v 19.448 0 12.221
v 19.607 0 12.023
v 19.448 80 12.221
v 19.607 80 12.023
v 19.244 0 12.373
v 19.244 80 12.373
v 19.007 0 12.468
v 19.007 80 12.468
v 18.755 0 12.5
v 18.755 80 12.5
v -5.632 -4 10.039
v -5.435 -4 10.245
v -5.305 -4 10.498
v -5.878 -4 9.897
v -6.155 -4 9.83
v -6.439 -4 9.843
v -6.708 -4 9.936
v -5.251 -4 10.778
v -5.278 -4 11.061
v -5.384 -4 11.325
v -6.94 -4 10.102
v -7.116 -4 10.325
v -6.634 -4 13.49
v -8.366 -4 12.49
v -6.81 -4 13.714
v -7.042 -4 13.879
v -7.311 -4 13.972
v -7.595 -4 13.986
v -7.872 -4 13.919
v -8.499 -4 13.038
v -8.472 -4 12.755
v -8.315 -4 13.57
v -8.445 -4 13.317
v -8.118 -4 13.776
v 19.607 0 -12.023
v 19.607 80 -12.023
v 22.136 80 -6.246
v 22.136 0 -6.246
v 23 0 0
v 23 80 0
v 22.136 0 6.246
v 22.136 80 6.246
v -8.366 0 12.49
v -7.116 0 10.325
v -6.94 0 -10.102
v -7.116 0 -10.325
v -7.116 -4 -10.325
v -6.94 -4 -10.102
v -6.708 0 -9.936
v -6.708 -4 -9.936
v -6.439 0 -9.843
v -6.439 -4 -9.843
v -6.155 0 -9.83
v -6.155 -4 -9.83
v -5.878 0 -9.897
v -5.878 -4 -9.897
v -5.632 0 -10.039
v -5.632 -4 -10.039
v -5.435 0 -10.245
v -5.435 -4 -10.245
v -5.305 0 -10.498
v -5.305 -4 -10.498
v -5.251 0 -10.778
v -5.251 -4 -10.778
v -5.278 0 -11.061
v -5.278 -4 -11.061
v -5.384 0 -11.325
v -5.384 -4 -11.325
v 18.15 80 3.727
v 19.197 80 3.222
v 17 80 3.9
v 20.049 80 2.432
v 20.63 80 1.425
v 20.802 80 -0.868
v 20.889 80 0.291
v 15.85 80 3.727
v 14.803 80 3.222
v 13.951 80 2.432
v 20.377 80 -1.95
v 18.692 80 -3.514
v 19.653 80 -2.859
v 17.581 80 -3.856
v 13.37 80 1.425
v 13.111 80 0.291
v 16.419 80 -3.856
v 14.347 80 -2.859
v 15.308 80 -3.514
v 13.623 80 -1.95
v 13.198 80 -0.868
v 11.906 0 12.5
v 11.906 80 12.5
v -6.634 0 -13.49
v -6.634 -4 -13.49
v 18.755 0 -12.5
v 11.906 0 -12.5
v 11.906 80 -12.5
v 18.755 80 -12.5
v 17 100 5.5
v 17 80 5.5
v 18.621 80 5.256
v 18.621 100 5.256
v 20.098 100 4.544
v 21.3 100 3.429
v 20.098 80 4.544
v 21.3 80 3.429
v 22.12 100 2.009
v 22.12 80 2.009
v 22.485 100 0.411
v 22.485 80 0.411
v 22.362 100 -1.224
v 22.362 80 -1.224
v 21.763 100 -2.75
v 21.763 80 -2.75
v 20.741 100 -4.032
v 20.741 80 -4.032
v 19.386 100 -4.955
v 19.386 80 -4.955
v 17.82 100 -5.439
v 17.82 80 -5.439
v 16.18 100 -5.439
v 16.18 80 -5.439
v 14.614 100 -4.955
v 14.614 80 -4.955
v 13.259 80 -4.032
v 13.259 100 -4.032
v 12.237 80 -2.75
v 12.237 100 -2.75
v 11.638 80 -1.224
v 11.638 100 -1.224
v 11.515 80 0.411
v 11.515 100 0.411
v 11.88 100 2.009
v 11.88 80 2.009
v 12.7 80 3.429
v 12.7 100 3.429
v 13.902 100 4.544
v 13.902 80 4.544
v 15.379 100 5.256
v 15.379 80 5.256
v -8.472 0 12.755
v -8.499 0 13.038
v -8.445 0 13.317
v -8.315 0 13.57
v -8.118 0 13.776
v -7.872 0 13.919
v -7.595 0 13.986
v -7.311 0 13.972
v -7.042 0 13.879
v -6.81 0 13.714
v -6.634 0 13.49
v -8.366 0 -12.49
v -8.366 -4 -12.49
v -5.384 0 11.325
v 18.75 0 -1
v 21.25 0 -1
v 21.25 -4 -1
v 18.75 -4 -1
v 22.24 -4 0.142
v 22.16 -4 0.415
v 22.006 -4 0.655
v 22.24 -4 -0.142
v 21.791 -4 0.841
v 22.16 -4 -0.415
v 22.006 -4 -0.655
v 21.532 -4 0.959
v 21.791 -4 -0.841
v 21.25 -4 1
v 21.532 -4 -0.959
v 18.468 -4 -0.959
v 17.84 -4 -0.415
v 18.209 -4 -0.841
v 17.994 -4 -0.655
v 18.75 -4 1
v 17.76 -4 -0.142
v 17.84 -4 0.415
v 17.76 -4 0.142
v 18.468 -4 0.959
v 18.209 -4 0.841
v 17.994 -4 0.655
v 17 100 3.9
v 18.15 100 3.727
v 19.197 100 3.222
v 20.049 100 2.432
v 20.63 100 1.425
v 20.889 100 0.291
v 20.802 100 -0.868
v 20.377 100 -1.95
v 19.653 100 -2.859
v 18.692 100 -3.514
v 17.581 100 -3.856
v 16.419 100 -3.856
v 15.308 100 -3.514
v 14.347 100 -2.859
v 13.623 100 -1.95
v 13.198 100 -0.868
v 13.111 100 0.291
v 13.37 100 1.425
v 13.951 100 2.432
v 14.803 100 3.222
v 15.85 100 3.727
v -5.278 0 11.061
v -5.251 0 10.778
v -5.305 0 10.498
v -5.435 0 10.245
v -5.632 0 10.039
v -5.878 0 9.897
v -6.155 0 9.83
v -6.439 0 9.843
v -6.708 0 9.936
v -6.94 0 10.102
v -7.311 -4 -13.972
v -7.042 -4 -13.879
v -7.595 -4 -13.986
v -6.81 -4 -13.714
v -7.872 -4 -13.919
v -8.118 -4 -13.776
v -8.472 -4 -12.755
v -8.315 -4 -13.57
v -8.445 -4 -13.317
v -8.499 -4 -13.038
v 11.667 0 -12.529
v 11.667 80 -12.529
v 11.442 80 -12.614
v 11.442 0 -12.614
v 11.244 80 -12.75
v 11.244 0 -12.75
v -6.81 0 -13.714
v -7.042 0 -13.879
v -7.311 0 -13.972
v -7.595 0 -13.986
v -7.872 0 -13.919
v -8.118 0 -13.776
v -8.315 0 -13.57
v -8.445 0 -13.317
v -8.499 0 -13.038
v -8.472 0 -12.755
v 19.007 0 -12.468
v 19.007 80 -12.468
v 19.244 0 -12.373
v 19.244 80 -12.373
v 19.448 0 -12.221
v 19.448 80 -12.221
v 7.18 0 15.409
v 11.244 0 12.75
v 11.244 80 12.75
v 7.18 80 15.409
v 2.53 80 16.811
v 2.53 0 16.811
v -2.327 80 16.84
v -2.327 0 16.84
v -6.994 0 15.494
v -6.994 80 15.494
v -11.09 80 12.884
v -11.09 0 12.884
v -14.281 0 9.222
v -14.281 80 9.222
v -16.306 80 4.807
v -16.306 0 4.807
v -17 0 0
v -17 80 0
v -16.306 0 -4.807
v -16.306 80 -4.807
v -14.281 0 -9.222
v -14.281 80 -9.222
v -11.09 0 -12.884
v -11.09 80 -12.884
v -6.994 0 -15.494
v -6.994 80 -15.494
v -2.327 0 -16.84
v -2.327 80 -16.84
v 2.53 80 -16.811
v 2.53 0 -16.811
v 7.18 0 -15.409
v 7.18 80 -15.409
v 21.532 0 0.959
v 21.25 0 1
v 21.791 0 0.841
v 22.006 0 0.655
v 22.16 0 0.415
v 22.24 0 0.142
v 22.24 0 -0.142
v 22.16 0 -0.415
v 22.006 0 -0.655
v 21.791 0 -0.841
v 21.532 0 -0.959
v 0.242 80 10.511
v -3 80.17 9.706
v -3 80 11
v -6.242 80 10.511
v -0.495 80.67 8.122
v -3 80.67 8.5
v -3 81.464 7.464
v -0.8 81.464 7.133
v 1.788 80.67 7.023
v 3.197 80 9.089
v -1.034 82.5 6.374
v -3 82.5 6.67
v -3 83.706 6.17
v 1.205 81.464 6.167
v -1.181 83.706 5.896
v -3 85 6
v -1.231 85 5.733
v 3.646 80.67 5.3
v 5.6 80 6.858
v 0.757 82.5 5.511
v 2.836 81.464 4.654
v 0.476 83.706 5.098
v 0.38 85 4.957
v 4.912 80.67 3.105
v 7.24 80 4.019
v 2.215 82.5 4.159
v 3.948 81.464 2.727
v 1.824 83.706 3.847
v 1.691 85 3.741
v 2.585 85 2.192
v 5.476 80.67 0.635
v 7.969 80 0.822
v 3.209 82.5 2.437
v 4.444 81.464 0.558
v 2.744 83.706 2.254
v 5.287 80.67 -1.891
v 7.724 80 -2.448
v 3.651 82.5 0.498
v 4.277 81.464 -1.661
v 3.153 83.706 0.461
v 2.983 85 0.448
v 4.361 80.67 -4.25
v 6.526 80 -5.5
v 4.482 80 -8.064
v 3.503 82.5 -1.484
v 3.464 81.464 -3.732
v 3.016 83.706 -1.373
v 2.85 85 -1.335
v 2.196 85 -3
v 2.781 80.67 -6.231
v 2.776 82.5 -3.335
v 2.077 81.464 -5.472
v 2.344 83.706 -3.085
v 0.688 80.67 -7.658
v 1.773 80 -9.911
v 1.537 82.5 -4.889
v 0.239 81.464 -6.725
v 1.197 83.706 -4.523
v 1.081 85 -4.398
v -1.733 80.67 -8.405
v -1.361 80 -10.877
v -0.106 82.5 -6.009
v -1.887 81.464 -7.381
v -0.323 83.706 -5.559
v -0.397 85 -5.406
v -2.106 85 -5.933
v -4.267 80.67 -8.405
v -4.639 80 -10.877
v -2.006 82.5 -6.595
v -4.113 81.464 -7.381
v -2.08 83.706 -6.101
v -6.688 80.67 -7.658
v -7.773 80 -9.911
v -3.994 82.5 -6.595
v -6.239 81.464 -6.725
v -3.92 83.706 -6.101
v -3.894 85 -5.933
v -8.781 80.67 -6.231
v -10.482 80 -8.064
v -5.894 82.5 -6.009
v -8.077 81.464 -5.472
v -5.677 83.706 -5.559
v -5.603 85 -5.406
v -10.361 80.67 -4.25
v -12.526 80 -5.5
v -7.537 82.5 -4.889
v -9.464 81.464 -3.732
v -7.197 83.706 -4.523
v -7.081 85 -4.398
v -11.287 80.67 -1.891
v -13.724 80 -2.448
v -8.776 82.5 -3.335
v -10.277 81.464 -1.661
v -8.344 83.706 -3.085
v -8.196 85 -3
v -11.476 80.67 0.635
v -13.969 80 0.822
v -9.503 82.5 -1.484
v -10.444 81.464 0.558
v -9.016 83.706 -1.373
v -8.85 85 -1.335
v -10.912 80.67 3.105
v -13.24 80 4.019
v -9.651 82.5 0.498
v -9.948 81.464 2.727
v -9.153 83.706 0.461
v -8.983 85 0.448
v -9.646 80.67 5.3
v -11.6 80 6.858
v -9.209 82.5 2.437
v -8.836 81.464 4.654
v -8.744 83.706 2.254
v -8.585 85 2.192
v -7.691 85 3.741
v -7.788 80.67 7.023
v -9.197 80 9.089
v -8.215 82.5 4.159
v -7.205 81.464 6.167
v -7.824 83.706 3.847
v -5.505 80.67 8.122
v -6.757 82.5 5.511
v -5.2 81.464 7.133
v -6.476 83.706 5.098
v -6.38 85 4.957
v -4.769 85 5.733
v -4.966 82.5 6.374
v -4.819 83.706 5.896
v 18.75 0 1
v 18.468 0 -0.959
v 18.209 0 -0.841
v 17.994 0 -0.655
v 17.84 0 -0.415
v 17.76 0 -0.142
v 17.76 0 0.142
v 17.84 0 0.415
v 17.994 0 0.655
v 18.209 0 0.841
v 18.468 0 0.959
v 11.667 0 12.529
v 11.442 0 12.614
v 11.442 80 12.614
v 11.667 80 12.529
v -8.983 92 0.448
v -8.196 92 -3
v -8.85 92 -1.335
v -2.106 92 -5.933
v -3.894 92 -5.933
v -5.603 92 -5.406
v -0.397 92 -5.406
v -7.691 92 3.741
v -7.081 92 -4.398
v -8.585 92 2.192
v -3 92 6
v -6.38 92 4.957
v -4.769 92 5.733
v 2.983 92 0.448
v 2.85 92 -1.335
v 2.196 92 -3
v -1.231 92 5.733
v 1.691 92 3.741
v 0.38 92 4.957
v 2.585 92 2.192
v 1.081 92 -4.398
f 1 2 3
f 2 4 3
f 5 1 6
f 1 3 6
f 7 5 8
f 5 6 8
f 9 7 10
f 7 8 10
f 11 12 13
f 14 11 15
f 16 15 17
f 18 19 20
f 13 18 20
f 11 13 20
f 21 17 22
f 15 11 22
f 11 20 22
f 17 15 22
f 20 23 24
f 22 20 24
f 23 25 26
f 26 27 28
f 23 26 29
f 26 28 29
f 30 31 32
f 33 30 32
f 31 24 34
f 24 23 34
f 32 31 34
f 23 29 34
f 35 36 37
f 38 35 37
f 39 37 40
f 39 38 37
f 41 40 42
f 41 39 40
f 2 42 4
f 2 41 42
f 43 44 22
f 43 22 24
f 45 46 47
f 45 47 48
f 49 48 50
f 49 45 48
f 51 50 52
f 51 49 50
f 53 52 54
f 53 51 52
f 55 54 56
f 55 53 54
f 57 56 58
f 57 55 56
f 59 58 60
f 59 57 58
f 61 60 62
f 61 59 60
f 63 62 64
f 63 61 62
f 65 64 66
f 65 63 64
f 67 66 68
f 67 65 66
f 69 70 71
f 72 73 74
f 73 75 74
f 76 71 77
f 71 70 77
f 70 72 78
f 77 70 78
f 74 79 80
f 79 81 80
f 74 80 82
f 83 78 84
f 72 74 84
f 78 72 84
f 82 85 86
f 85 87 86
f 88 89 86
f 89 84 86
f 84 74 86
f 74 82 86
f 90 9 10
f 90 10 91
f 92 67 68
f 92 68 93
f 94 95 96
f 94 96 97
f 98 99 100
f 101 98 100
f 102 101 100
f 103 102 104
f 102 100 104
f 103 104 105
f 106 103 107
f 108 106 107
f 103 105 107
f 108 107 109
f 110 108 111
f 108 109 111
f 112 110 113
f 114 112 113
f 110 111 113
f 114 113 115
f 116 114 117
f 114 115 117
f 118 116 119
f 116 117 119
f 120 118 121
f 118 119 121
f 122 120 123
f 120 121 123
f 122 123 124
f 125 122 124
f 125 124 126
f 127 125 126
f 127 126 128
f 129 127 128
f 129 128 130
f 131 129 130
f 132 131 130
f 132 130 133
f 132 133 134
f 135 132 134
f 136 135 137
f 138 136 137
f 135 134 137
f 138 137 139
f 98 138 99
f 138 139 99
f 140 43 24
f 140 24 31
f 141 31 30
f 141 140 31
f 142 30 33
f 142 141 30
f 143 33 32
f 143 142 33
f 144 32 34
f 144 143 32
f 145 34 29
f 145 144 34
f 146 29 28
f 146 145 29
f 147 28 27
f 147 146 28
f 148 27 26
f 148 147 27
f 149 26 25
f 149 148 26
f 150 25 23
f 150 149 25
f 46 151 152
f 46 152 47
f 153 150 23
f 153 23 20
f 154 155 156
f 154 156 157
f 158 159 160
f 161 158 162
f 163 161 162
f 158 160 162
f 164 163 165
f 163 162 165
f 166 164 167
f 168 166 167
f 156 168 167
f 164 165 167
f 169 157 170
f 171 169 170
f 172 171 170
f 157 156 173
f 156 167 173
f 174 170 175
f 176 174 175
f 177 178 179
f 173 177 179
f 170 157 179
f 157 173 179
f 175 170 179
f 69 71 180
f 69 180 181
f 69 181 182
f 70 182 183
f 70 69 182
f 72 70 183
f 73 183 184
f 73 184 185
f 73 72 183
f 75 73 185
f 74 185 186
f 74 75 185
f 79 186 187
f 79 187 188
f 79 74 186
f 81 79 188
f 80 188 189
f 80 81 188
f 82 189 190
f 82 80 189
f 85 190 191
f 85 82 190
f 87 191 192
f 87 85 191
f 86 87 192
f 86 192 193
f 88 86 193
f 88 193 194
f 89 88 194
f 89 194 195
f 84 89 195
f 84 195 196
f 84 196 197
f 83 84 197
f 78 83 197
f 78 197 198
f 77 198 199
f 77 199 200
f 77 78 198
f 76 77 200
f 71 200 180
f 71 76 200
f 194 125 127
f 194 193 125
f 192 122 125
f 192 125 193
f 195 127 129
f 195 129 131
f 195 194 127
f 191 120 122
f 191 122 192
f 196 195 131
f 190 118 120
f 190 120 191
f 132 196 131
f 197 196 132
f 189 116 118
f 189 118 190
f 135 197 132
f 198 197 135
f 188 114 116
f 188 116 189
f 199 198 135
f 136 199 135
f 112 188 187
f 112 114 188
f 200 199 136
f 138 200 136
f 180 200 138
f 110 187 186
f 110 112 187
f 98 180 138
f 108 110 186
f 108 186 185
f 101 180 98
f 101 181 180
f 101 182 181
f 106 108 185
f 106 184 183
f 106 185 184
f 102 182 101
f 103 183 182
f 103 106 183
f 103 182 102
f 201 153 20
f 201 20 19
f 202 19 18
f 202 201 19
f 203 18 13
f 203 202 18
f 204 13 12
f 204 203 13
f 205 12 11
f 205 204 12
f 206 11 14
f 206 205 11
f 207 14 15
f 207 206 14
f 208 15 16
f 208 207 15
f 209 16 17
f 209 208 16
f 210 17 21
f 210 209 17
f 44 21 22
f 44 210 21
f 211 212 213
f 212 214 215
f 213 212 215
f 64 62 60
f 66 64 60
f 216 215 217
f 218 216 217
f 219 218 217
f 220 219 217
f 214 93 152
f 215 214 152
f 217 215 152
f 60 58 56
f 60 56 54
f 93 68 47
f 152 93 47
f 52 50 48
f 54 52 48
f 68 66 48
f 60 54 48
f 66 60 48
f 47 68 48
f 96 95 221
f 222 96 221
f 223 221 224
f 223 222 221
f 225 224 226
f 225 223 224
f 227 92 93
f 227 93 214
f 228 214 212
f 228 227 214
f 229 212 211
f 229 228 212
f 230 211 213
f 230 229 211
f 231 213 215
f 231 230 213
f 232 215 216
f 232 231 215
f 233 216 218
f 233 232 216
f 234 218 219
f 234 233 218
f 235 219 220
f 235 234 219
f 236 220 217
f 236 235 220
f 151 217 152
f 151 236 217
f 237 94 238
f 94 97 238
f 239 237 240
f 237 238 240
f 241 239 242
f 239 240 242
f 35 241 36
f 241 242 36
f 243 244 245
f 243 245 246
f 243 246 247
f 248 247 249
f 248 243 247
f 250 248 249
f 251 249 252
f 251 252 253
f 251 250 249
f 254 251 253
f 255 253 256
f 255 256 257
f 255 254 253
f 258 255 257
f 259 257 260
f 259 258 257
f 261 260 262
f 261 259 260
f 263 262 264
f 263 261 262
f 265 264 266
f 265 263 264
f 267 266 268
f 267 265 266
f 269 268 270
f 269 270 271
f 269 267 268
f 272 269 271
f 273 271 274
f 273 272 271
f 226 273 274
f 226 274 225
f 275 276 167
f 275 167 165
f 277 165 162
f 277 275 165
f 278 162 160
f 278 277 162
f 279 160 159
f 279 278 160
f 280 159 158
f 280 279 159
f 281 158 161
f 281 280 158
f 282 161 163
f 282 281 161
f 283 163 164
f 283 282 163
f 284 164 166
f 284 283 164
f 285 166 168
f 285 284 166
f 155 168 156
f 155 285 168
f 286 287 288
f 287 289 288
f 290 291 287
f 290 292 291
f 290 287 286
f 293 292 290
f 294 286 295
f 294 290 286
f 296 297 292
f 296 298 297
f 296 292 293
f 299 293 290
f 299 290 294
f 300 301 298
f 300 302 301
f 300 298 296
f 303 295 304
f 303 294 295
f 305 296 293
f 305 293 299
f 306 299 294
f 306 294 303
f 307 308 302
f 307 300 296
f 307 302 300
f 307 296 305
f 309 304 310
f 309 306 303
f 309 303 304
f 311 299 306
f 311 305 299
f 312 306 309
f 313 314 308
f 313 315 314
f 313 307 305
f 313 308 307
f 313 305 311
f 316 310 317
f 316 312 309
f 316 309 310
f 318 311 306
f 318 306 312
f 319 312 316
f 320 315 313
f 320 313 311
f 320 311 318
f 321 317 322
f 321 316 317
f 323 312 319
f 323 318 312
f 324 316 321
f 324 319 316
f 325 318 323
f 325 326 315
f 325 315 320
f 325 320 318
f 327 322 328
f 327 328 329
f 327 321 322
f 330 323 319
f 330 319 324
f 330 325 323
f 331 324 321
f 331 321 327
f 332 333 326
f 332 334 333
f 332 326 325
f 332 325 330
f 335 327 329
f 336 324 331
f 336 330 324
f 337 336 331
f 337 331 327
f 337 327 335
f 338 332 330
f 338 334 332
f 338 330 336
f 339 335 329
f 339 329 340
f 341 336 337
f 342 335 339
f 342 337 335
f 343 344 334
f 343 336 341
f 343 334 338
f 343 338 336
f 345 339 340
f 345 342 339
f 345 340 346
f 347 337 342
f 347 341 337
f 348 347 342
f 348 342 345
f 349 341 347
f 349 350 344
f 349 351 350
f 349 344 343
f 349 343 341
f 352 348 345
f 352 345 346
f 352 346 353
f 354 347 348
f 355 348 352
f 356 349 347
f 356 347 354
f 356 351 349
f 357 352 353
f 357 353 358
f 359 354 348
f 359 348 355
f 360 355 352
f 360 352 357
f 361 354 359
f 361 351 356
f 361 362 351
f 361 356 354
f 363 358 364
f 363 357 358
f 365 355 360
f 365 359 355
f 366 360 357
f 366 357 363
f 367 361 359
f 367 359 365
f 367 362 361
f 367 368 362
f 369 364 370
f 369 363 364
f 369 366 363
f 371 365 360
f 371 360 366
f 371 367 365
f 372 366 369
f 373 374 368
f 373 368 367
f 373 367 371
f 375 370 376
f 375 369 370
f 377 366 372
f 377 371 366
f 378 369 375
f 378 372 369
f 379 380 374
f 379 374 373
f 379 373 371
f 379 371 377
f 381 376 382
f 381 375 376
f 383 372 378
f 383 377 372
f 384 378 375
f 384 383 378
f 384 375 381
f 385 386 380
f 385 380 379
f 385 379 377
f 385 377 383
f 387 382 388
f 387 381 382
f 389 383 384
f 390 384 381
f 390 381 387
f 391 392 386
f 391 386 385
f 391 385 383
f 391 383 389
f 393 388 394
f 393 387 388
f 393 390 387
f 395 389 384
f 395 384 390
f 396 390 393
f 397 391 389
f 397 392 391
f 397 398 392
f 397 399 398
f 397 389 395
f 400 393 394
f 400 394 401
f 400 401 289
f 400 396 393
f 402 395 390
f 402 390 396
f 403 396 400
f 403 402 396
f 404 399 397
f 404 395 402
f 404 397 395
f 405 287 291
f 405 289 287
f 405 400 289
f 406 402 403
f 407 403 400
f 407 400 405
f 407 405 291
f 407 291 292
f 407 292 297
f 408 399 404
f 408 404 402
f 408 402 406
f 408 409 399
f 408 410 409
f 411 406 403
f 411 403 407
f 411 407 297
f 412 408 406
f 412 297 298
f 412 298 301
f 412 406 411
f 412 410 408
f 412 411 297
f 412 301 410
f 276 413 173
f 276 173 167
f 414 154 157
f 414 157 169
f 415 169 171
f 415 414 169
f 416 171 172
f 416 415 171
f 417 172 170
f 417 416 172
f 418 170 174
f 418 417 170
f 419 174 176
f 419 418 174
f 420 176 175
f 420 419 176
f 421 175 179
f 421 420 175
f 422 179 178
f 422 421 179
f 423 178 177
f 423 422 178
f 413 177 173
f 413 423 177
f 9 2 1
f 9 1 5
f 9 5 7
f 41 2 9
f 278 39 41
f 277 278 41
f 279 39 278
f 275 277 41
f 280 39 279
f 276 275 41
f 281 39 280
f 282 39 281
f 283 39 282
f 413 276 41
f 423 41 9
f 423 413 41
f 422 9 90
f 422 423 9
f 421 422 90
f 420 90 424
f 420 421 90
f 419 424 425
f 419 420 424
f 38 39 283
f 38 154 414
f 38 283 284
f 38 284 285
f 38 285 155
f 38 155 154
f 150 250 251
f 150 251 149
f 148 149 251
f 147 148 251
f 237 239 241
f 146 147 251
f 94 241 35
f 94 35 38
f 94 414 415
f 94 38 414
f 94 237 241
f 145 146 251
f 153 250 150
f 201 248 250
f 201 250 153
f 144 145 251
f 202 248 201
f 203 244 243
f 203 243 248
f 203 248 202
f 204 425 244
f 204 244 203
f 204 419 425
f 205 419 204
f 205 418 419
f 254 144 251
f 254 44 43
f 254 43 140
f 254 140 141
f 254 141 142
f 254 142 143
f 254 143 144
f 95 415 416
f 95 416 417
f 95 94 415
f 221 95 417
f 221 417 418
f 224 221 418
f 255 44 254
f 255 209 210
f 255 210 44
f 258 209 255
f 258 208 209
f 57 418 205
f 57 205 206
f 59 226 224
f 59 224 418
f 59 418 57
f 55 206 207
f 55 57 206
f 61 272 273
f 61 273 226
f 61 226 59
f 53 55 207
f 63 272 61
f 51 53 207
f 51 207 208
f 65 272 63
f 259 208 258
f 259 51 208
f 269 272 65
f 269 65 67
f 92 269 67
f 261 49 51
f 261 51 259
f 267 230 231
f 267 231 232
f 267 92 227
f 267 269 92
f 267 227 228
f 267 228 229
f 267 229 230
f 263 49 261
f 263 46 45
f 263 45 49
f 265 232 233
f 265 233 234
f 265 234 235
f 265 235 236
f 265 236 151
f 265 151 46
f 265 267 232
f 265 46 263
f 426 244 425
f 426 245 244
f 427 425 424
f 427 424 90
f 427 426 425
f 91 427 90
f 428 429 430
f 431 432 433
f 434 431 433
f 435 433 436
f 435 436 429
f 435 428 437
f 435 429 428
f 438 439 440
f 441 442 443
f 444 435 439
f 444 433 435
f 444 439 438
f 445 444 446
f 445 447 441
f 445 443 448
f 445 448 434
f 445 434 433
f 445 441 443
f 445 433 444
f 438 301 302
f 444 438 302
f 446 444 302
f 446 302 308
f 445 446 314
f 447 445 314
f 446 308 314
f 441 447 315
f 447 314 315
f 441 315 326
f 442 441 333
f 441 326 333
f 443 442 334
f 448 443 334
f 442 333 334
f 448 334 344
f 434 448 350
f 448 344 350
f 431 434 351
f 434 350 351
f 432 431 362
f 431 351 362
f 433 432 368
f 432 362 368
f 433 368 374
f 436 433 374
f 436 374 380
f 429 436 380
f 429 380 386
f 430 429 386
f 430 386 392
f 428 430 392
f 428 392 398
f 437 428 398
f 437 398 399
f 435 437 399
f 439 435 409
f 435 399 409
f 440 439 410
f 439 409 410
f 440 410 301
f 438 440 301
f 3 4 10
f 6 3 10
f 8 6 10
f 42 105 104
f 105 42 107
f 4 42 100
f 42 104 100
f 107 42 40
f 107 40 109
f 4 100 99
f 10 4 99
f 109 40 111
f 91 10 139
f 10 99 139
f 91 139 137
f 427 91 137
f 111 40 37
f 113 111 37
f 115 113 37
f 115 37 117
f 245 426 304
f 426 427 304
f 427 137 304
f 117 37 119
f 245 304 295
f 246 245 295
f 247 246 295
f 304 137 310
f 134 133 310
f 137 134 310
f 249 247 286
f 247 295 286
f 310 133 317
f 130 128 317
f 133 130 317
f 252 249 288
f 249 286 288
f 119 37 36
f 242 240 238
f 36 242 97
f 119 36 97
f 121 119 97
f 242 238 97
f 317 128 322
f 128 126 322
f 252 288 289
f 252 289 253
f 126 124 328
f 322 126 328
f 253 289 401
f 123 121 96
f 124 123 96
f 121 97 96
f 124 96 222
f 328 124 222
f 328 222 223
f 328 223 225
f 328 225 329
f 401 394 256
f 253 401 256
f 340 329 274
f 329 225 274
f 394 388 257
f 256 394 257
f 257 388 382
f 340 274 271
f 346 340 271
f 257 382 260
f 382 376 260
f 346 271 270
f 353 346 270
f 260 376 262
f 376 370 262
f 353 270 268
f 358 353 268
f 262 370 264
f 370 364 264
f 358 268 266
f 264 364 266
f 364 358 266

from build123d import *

# Parameters (mm, degrees)
BOSS_EXTRUDE1_DEPTH = 80
SKETCH2_R           = 5.5
SKETCH2_R_2         = 3.9
BOSS_EXTRUDE2_DEPTH = 20
SKETCH3_R           = 6
BOSS_EXTRUDE3_DEPTH = 12
FILLET1_R           = 5
BOSS_EXTRUDE4_DEPTH = 4
FILLET2_R           = 1


with BuildPart() as part:
    # Sketch1 → Boss-Extrude1 (new body)
    with BuildSketch(Plane(origin=(0, 0, 0), x_dir=(1, 0, 0), z_dir=(0, 1, 0))):
        with BuildLine():
            Line((11.521718622, 12.5), (19.306734576, 12.5))
            ThreePointArc((19.306734576, 12.5), (23, 0), (19.306734576, -12.5))
            Line((19.306734576, -12.5), (11.521718622, -12.5))
            ThreePointArc((11.521718622, -12.5), (-17, 0), (11.521718622, 12.5))
        make_face()
    extrude(amount=BOSS_EXTRUDE1_DEPTH)

    # Sketch2 → Boss-Extrude2 (add)
    with BuildSketch(Plane(origin=(0, 80, 0), x_dir=(1, 0, 0), z_dir=(0, 1, 0))):
        with Locations(Location((17, 0, 0), (0, 0, 270))):
            Circle(SKETCH2_R)
        with Locations(Location((17, 0, 0), (0, 0, 270))):
            Circle(SKETCH2_R_2, mode=Mode.SUBTRACT)
    extrude(amount=BOSS_EXTRUDE2_DEPTH)

    # Sketch3 → Boss-Extrude3 (add)
    with BuildSketch(Plane(origin=(0, 80, 0), x_dir=(1, 0, 0), z_dir=(0, 1, 0))):
        with Locations(Location((-3, 0, 0), (0, 0, 270))):
            Circle(SKETCH3_R)
    extrude(amount=BOSS_EXTRUDE3_DEPTH)

    # Fillet1
    fillet1_edges = [part.edges().sort_by_distance(p)[0] for p in [
        (-3, 80, -6),
    ]]
    fillet(fillet1_edges, radius=FILLET1_R)

    # Sketch4 → Boss-Extrude4 (add)
    with BuildSketch(Plane.XZ):
        with BuildLine():
            Line((-7.116025404, 10.325317547), (-8.366025404, 12.490381057))
            ThreePointArc((-8.366025404, 12.490381057), (-8, 13.856406461), (-6.633974596, 13.490381057))
            Line((-6.633974596, 13.490381057), (-5.383974596, 11.325317547))
            ThreePointArc((-5.383974596, 11.325317547), (-5.75, 9.959292144), (-7.116025404, 10.325317547))
        make_face()
        with BuildLine():
            Line((-5.383974596, -11.325317547), (-6.633974596, -13.490381057))
            ThreePointArc((-6.633974596, -13.490381057), (-8, -13.856406461), (-8.366025404, -12.490381057))
            Line((-8.366025404, -12.490381057), (-7.116025404, -10.325317547))
            ThreePointArc((-7.116025404, -10.325317547), (-5.75, -9.959292144), (-5.383974596, -11.325317547))
        make_face()
        with BuildLine():
            Line((18.75, 1), (21.25, 1))
            ThreePointArc((21.25, 1), (22.25, 0), (21.25, -1))
            Line((21.25, -1), (18.75, -1))
            ThreePointArc((18.75, -1), (17.75, 0), (18.75, 1))
        make_face()
    extrude(amount=BOSS_EXTRUDE4_DEPTH)

    # Fillet2
    fillet2_edges = [part.edges().sort_by_distance(p)[0] for p in [
        (11.521718622, 40, -12.5),
        (19.306734576, 40, -12.5),
        (19.306734576, 40, 12.5),
        (11.521718622, 40, 12.5),
    ]]
    fillet(fillet2_edges, radius=FILLET2_R)


solid = part.part
